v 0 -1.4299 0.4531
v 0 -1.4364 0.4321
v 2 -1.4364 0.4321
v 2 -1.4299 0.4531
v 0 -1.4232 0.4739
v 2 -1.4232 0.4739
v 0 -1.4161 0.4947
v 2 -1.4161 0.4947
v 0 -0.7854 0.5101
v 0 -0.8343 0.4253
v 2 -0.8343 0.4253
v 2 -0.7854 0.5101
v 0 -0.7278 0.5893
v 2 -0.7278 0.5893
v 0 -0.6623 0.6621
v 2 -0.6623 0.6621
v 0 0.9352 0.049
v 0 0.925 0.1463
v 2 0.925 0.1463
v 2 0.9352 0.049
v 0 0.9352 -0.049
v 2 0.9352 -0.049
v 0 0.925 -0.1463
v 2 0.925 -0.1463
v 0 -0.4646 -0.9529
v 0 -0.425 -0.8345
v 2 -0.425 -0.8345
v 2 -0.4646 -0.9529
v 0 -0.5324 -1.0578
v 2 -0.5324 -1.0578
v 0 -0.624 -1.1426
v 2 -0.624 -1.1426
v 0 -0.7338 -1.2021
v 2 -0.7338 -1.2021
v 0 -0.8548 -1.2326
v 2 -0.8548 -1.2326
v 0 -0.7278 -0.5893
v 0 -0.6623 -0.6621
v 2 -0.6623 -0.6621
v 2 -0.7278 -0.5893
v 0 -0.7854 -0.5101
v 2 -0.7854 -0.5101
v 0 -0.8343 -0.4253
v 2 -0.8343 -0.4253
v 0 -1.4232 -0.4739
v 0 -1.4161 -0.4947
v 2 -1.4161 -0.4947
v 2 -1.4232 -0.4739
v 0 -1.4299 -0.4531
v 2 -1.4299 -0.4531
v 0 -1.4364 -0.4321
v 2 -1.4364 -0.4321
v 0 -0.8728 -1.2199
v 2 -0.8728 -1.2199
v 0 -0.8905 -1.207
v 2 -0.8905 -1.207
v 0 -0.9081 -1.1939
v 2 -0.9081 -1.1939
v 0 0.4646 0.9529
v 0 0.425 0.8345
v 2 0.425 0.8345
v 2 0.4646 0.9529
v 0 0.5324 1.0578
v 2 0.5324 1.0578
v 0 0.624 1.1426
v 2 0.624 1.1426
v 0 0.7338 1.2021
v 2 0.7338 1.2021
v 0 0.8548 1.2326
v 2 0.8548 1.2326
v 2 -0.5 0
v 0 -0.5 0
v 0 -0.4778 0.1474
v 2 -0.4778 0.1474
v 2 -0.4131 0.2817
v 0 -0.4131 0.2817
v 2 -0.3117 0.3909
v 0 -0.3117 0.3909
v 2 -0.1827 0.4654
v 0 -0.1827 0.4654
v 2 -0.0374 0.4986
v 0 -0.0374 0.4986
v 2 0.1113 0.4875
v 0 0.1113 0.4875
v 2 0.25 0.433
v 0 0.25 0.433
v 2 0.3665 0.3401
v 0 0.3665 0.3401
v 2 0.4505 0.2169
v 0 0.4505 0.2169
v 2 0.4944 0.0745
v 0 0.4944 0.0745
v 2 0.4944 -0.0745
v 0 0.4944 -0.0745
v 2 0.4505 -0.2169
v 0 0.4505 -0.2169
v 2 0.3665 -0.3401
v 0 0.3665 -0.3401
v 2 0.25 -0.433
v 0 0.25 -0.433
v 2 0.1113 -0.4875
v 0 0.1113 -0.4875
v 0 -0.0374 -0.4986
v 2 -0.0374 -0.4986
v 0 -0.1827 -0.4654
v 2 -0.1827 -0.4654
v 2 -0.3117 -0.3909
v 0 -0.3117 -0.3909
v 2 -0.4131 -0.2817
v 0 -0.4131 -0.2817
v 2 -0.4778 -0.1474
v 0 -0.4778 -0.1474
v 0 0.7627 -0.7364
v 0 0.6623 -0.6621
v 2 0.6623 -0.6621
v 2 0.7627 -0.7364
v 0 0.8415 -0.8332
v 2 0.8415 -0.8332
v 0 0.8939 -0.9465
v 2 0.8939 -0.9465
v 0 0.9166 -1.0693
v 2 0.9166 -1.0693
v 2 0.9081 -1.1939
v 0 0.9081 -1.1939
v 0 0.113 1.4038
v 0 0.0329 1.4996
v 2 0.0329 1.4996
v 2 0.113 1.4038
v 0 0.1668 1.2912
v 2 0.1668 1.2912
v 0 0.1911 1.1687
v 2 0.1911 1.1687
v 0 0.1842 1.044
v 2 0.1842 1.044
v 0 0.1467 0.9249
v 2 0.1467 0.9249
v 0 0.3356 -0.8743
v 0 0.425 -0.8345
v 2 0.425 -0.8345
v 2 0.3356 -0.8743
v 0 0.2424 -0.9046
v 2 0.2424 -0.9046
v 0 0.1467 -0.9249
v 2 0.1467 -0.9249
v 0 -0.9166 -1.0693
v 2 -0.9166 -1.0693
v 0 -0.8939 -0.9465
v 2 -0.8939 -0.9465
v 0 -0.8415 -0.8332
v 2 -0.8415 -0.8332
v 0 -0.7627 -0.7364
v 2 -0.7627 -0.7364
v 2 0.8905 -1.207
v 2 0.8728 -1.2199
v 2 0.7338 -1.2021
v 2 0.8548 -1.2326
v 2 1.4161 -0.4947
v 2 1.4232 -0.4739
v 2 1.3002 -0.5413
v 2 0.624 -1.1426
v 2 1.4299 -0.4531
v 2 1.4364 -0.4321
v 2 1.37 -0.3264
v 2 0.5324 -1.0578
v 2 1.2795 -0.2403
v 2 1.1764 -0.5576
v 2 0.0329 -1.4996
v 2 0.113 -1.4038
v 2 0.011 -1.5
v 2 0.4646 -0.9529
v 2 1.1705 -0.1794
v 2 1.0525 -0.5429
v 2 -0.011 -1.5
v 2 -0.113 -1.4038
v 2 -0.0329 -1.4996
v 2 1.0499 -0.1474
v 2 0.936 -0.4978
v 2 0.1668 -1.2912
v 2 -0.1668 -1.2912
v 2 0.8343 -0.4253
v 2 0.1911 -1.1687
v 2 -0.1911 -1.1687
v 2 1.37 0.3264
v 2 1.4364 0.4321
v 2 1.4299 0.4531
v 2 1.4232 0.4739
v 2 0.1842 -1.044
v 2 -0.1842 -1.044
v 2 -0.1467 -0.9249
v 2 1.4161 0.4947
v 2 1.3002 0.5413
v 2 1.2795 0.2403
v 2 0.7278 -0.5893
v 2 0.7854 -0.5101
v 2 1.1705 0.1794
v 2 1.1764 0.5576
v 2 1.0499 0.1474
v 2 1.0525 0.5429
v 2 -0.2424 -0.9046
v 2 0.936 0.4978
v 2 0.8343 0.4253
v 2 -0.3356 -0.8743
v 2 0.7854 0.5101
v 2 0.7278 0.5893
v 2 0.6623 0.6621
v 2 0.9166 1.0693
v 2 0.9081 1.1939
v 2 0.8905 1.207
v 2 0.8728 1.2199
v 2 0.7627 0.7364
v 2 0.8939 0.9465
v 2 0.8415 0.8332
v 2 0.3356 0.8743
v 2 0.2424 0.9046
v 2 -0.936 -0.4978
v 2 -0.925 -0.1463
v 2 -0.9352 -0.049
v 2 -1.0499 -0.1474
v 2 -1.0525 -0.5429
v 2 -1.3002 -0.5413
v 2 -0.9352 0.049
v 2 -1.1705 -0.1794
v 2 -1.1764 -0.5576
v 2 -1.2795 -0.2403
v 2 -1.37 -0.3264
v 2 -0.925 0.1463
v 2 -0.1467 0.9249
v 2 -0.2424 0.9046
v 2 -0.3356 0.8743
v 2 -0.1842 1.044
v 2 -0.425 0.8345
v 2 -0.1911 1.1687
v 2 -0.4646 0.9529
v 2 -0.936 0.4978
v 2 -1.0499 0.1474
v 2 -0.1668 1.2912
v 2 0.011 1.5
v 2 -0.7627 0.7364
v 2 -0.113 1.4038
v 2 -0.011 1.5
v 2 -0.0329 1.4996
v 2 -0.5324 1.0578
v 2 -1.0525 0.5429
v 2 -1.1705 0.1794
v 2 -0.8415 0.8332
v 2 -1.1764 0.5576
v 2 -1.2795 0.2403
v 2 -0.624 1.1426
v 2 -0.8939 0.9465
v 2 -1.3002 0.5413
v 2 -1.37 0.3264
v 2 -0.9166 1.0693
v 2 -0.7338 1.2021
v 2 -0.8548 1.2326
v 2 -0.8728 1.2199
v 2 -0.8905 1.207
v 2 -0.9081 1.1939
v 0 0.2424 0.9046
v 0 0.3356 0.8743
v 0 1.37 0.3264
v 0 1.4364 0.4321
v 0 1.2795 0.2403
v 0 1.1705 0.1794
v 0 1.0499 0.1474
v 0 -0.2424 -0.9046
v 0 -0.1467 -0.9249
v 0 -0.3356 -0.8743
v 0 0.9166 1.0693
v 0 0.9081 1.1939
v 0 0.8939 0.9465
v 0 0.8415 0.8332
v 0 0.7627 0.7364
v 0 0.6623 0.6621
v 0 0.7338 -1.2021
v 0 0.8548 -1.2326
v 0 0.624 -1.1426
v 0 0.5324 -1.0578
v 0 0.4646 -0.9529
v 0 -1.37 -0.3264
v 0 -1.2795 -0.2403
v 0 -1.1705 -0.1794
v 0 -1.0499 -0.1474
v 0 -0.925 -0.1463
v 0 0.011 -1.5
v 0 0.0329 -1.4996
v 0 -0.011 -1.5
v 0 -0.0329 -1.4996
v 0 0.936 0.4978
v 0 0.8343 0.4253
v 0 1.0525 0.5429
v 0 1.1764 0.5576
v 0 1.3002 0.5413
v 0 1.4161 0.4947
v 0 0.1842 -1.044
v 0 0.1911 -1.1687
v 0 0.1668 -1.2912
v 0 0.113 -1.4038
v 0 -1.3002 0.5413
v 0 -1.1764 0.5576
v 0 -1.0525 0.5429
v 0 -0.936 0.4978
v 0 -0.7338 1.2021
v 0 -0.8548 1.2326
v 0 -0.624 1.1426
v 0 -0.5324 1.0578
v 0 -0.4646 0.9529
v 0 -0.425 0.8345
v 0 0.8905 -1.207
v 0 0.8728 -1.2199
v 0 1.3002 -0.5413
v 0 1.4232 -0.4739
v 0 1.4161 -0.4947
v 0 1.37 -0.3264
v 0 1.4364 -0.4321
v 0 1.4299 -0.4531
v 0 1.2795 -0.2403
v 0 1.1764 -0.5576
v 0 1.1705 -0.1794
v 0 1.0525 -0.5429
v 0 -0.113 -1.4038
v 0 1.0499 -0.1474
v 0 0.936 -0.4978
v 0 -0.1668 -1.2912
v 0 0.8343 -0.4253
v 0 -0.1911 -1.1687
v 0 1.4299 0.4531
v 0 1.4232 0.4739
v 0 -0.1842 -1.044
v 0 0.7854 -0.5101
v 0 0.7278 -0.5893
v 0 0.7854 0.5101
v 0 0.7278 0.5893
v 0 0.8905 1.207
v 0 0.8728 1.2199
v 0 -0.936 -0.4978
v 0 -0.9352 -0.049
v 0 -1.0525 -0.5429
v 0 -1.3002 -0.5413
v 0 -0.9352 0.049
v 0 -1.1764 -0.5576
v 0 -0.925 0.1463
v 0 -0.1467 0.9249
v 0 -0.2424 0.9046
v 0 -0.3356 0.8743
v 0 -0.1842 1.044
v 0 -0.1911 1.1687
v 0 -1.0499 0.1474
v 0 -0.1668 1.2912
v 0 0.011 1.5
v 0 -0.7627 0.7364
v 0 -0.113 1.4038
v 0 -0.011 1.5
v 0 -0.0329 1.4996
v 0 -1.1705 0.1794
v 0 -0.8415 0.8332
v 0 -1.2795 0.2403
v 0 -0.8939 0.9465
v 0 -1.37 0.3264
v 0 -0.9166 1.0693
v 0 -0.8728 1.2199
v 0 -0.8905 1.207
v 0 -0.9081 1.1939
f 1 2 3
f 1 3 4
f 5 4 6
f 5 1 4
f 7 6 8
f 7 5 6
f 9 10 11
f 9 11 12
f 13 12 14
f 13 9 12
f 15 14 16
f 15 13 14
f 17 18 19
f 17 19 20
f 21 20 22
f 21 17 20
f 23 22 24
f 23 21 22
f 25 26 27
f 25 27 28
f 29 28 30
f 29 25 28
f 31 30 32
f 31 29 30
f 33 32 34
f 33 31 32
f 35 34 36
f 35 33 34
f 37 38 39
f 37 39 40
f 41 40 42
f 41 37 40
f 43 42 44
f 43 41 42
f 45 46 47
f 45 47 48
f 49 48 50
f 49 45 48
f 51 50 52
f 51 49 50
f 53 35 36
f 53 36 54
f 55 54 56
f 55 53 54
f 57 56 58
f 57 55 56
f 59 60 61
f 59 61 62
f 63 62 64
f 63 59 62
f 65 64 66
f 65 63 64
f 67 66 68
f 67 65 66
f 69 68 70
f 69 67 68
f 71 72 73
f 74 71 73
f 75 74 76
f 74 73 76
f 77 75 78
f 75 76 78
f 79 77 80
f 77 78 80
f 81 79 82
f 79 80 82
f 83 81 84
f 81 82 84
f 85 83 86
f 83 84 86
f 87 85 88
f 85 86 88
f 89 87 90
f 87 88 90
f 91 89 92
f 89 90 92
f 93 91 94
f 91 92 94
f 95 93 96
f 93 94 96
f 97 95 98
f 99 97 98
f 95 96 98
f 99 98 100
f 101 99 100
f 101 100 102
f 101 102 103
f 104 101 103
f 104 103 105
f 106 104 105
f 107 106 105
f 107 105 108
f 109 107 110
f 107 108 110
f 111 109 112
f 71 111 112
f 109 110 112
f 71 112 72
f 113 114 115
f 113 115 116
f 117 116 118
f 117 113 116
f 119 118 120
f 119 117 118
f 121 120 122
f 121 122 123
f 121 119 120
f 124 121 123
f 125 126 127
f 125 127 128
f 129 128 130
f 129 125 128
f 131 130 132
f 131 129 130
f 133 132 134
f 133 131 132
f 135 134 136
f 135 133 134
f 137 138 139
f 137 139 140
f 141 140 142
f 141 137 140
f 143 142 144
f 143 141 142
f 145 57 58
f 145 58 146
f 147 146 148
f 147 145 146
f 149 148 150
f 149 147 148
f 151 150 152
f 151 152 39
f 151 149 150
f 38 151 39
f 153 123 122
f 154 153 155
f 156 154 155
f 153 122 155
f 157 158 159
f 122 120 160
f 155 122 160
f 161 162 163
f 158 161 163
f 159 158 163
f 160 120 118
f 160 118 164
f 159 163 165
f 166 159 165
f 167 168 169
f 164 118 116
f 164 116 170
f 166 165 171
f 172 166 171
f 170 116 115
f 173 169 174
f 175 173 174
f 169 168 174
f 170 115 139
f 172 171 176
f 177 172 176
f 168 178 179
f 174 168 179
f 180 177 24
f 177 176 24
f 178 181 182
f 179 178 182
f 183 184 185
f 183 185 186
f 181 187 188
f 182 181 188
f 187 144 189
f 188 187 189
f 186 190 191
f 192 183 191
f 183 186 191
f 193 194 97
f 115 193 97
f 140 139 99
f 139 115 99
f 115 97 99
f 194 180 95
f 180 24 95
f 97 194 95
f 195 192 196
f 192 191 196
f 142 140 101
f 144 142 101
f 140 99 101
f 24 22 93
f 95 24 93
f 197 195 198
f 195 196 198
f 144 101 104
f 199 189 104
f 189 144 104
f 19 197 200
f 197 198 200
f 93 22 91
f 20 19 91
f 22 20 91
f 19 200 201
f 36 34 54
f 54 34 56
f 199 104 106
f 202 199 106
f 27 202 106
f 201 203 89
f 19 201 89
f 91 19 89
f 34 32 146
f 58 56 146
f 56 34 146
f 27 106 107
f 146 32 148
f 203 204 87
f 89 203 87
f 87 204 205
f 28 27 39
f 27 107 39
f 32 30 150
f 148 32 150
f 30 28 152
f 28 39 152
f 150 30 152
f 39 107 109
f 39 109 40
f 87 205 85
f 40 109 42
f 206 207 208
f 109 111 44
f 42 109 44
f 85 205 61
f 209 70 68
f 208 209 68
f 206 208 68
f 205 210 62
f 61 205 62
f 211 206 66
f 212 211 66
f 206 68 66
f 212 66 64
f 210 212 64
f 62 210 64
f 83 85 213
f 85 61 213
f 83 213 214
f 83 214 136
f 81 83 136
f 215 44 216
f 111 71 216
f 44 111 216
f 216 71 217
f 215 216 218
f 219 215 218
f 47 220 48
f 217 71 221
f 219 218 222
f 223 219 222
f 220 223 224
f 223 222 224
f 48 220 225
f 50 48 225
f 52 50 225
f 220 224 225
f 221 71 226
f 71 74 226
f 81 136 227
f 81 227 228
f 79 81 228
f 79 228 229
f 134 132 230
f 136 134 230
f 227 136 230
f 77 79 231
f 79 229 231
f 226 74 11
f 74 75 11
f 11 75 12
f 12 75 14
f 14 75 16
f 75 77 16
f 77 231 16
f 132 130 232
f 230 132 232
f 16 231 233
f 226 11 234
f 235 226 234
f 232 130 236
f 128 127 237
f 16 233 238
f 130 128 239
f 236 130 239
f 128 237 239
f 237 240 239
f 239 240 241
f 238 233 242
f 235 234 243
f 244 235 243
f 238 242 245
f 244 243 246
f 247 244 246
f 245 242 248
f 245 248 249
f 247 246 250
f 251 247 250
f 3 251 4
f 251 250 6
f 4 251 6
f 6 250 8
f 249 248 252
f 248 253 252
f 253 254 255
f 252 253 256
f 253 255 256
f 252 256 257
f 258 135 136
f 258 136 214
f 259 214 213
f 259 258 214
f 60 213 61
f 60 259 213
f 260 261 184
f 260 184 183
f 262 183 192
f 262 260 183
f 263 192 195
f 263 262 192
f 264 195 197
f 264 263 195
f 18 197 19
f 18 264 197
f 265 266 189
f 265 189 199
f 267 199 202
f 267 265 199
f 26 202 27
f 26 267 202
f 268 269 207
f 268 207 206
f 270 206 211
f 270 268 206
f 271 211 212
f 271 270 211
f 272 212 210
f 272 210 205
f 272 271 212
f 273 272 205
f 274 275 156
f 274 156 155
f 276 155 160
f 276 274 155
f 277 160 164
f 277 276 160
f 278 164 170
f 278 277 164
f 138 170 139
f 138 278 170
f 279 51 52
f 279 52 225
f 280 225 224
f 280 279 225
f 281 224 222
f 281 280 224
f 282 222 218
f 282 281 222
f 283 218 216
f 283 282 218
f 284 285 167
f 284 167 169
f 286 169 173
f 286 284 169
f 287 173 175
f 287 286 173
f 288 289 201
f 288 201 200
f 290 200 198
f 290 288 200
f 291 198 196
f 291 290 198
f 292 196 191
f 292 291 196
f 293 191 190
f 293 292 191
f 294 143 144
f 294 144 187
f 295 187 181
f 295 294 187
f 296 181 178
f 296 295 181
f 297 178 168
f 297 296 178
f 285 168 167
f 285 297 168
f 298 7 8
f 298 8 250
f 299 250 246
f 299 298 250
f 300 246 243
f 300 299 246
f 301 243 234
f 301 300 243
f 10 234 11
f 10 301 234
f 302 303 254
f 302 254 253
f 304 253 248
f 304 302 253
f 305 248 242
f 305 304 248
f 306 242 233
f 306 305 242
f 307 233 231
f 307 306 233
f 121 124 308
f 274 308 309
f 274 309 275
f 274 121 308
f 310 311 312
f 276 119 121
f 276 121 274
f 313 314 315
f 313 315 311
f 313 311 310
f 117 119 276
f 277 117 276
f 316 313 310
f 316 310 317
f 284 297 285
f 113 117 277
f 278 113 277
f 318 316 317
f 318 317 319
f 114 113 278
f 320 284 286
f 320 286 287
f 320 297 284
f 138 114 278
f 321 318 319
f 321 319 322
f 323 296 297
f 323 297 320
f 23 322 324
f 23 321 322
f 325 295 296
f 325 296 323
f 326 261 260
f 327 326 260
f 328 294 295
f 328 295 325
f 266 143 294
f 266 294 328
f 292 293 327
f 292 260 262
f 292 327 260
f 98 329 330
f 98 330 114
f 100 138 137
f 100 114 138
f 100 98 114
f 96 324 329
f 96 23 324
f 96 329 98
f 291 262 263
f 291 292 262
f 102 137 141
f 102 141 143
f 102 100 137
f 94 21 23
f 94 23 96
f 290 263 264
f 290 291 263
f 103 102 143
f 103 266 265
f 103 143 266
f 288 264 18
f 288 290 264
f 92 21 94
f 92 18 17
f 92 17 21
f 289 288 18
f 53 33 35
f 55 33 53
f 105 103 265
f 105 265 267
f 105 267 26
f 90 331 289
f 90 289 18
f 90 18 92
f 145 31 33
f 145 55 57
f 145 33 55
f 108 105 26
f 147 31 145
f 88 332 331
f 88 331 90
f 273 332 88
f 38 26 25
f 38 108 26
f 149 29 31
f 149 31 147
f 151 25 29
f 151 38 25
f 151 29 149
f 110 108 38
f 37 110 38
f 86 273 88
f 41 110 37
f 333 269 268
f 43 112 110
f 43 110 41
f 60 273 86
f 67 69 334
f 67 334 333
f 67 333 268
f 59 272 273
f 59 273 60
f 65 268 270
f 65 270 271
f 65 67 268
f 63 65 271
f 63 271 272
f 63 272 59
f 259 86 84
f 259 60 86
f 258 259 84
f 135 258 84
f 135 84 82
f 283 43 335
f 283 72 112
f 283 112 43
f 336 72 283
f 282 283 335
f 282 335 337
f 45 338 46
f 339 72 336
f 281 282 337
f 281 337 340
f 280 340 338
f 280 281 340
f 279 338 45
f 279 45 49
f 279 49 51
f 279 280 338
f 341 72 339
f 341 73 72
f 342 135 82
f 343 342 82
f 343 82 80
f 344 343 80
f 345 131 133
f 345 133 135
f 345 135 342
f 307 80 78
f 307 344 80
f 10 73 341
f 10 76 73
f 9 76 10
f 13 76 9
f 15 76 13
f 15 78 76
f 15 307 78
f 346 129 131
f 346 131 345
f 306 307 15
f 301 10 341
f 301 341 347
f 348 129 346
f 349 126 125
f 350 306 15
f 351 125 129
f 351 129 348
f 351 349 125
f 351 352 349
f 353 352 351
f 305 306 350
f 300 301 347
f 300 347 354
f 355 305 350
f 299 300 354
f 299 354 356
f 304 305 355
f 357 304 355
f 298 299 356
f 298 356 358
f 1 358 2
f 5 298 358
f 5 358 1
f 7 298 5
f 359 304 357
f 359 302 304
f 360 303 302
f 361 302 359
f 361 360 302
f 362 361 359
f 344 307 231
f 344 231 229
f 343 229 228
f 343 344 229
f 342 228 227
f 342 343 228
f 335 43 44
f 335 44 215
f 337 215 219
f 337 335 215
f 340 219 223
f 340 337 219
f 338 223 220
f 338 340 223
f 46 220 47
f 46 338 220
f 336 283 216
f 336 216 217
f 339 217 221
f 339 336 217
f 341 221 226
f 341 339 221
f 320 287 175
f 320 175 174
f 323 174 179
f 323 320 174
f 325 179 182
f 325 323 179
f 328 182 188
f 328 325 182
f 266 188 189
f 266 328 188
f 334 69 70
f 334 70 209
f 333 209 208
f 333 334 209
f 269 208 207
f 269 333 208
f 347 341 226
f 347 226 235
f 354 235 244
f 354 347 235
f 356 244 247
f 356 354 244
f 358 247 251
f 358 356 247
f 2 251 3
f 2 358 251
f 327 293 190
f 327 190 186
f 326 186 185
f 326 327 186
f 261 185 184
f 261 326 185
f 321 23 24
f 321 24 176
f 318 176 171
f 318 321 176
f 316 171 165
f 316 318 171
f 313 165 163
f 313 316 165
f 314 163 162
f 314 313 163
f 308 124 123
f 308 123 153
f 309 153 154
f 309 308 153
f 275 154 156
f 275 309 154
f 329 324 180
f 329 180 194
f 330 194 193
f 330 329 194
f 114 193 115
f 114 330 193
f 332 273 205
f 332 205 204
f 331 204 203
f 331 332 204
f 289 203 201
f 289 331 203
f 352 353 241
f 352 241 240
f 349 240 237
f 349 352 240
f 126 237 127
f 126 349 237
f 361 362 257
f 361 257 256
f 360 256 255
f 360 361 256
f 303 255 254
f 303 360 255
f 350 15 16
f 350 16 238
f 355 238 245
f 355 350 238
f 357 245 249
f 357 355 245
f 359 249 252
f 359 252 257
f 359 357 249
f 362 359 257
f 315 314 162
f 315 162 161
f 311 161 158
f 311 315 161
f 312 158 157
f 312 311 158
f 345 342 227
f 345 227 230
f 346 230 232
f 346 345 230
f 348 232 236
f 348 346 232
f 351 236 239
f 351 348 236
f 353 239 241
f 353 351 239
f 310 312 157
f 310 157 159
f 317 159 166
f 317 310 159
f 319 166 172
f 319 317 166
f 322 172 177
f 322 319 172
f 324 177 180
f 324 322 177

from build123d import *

# Parameters (mm, degrees)
ESQUISSE1_R        = 0.5
BOSS_EXTRU_1_DEPTH = 2


with BuildPart() as part:
    # Esquisse1 → Boss.-Extru.1 (new body)
    with BuildSketch(Plane(origin=(0, 0, 0), x_dir=(0, -1, 0), z_dir=(-1, 0, 0))):
        with BuildLine():
            ThreePointArc((-0.908086992, -1.193891961), (-0.881677878, -1.213525492), (-0.854844416, -1.232574957))
            ThreePointArc((-0.854844416, -1.232574957), (-0.575515338, -1.103091387), (-0.424999995, -0.834510188))
            ThreePointArc((-0.424999995, -0.834510188), (-0.289394415, -0.890664428), (-0.146680563, -0.924941654))
            ThreePointArc((-0.146680563, -0.924941654), (-0.18277916, -1.230699107), (-0.032905721, -1.499639028))
            ThreePointArc((-0.032905721, -1.499639028), (0, -1.5), (0.032905721, -1.499639028))
            ThreePointArc((0.032905721, -1.499639028), (0.18277916, -1.230699107), (0.146680563, -0.924941654))
            ThreePointArc((0.146680563, -0.924941654), (0.289394415, -0.890664428), (0.424999995, -0.834510188))
            ThreePointArc((0.424999995, -0.834510188), (0.575515338, -1.103091387), (0.854844416, -1.232574957))
            ThreePointArc((0.854844416, -1.232574957), (0.881677878, -1.213525492), (0.908086992, -1.193891961))
            ThreePointArc((0.908086992, -1.193891961), (0.871258232, -0.888221597), (0.662334131, -0.662076845))
            ThreePointArc((0.662334131, -0.662076845), (0.757644415, -0.550460889), (0.834345, -0.425324195))
            ThreePointArc((0.834345, -0.425324195), (1.113982538, -0.55414025), (1.416073042, -0.494709146))
            ThreePointArc((1.416073042, -0.494709146), (1.426584774, -0.463525492), (1.436409897, -0.432118744))
            ThreePointArc((1.436409897, -0.432118744), (1.226946272, -0.206473627), (0.924998573, -0.146321185))
            ThreePointArc((0.924998573, -0.146321185), (0.9365, 0), (0.924998573, 0.146321185))
            ThreePointArc((0.924998573, 0.146321185), (1.226946272, 0.206473627), (1.436409897, 0.432118744))
            ThreePointArc((1.436409897, 0.432118744), (1.426584774, 0.463525492), (1.416073042, 0.494709146))
            ThreePointArc((1.416073042, 0.494709146), (1.113982538, 0.55414025), (0.834345, 0.425324195))
            ThreePointArc((0.834345, 0.425324195), (0.757644415, 0.550460889), (0.662334131, 0.662076845))
            ThreePointArc((0.662334131, 0.662076845), (0.871258232, 0.888221597), (0.908086992, 1.193891961))
            ThreePointArc((0.908086992, 1.193891961), (0.881677878, 1.213525492), (0.854844416, 1.232574957))
            ThreePointArc((0.854844416, 1.232574957), (0.575515338, 1.103091387), (0.424999995, 0.834510188))
            ThreePointArc((0.424999995, 0.834510188), (0.289394415, 0.890664428), (0.146680563, 0.924941654))
            ThreePointArc((0.146680563, 0.924941654), (0.18277916, 1.230699107), (0.032905721, 1.499639028))
            ThreePointArc((0.032905721, 1.499639028), (0, 1.5), (-0.032905721, 1.499639028))
            ThreePointArc((-0.032905721, 1.499639028), (-0.18277916, 1.230699107), (-0.146680563, 0.924941654))
            ThreePointArc((-0.146680563, 0.924941654), (-0.289394415, 0.890664428), (-0.424999995, 0.834510188))
            ThreePointArc((-0.424999995, 0.834510188), (-0.575515338, 1.103091387), (-0.854844416, 1.232574957))
            ThreePointArc((-0.854844416, 1.232574957), (-0.881677878, 1.213525492), (-0.908086992, 1.193891961))
            ThreePointArc((-0.908086992, 1.193891961), (-0.871258232, 0.888221597), (-0.662334131, 0.662076845))
            ThreePointArc((-0.662334131, 0.662076845), (-0.757644415, 0.550460889), (-0.834345, 0.425324195))
            ThreePointArc((-0.834345, 0.425324195), (-1.113982538, 0.55414025), (-1.416073042, 0.494709146))
            ThreePointArc((-1.416073042, 0.494709146), (-1.426584774, 0.463525492), (-1.436409897, 0.432118744))
            ThreePointArc((-1.436409897, 0.432118744), (-1.226946272, 0.206473627), (-0.924998573, 0.146321185))
            ThreePointArc((-0.924998573, 0.146321185), (-0.9365, 0), (-0.924998573, -0.146321185))
            ThreePointArc((-0.924998573, -0.146321185), (-1.226946272, -0.206473627), (-1.436409897, -0.432118744))
            ThreePointArc((-1.436409897, -0.432118744), (-1.426584774, -0.463525492), (-1.416073042, -0.494709146))
            ThreePointArc((-1.416073042, -0.494709146), (-1.113982538, -0.55414025), (-0.834345, -0.425324195))
            ThreePointArc((-0.834345, -0.425324195), (-0.757644415, -0.550460889), (-0.662334131, -0.662076845))
            ThreePointArc((-0.662334131, -0.662076845), (-0.871258232, -0.888221597), (-0.908086992, -1.193891961))
        make_face()
        Circle(ESQUISSE1_R, mode=Mode.SUBTRACT)
    extrude(amount=-BOSS_EXTRU_1_DEPTH)


solid = part.part
